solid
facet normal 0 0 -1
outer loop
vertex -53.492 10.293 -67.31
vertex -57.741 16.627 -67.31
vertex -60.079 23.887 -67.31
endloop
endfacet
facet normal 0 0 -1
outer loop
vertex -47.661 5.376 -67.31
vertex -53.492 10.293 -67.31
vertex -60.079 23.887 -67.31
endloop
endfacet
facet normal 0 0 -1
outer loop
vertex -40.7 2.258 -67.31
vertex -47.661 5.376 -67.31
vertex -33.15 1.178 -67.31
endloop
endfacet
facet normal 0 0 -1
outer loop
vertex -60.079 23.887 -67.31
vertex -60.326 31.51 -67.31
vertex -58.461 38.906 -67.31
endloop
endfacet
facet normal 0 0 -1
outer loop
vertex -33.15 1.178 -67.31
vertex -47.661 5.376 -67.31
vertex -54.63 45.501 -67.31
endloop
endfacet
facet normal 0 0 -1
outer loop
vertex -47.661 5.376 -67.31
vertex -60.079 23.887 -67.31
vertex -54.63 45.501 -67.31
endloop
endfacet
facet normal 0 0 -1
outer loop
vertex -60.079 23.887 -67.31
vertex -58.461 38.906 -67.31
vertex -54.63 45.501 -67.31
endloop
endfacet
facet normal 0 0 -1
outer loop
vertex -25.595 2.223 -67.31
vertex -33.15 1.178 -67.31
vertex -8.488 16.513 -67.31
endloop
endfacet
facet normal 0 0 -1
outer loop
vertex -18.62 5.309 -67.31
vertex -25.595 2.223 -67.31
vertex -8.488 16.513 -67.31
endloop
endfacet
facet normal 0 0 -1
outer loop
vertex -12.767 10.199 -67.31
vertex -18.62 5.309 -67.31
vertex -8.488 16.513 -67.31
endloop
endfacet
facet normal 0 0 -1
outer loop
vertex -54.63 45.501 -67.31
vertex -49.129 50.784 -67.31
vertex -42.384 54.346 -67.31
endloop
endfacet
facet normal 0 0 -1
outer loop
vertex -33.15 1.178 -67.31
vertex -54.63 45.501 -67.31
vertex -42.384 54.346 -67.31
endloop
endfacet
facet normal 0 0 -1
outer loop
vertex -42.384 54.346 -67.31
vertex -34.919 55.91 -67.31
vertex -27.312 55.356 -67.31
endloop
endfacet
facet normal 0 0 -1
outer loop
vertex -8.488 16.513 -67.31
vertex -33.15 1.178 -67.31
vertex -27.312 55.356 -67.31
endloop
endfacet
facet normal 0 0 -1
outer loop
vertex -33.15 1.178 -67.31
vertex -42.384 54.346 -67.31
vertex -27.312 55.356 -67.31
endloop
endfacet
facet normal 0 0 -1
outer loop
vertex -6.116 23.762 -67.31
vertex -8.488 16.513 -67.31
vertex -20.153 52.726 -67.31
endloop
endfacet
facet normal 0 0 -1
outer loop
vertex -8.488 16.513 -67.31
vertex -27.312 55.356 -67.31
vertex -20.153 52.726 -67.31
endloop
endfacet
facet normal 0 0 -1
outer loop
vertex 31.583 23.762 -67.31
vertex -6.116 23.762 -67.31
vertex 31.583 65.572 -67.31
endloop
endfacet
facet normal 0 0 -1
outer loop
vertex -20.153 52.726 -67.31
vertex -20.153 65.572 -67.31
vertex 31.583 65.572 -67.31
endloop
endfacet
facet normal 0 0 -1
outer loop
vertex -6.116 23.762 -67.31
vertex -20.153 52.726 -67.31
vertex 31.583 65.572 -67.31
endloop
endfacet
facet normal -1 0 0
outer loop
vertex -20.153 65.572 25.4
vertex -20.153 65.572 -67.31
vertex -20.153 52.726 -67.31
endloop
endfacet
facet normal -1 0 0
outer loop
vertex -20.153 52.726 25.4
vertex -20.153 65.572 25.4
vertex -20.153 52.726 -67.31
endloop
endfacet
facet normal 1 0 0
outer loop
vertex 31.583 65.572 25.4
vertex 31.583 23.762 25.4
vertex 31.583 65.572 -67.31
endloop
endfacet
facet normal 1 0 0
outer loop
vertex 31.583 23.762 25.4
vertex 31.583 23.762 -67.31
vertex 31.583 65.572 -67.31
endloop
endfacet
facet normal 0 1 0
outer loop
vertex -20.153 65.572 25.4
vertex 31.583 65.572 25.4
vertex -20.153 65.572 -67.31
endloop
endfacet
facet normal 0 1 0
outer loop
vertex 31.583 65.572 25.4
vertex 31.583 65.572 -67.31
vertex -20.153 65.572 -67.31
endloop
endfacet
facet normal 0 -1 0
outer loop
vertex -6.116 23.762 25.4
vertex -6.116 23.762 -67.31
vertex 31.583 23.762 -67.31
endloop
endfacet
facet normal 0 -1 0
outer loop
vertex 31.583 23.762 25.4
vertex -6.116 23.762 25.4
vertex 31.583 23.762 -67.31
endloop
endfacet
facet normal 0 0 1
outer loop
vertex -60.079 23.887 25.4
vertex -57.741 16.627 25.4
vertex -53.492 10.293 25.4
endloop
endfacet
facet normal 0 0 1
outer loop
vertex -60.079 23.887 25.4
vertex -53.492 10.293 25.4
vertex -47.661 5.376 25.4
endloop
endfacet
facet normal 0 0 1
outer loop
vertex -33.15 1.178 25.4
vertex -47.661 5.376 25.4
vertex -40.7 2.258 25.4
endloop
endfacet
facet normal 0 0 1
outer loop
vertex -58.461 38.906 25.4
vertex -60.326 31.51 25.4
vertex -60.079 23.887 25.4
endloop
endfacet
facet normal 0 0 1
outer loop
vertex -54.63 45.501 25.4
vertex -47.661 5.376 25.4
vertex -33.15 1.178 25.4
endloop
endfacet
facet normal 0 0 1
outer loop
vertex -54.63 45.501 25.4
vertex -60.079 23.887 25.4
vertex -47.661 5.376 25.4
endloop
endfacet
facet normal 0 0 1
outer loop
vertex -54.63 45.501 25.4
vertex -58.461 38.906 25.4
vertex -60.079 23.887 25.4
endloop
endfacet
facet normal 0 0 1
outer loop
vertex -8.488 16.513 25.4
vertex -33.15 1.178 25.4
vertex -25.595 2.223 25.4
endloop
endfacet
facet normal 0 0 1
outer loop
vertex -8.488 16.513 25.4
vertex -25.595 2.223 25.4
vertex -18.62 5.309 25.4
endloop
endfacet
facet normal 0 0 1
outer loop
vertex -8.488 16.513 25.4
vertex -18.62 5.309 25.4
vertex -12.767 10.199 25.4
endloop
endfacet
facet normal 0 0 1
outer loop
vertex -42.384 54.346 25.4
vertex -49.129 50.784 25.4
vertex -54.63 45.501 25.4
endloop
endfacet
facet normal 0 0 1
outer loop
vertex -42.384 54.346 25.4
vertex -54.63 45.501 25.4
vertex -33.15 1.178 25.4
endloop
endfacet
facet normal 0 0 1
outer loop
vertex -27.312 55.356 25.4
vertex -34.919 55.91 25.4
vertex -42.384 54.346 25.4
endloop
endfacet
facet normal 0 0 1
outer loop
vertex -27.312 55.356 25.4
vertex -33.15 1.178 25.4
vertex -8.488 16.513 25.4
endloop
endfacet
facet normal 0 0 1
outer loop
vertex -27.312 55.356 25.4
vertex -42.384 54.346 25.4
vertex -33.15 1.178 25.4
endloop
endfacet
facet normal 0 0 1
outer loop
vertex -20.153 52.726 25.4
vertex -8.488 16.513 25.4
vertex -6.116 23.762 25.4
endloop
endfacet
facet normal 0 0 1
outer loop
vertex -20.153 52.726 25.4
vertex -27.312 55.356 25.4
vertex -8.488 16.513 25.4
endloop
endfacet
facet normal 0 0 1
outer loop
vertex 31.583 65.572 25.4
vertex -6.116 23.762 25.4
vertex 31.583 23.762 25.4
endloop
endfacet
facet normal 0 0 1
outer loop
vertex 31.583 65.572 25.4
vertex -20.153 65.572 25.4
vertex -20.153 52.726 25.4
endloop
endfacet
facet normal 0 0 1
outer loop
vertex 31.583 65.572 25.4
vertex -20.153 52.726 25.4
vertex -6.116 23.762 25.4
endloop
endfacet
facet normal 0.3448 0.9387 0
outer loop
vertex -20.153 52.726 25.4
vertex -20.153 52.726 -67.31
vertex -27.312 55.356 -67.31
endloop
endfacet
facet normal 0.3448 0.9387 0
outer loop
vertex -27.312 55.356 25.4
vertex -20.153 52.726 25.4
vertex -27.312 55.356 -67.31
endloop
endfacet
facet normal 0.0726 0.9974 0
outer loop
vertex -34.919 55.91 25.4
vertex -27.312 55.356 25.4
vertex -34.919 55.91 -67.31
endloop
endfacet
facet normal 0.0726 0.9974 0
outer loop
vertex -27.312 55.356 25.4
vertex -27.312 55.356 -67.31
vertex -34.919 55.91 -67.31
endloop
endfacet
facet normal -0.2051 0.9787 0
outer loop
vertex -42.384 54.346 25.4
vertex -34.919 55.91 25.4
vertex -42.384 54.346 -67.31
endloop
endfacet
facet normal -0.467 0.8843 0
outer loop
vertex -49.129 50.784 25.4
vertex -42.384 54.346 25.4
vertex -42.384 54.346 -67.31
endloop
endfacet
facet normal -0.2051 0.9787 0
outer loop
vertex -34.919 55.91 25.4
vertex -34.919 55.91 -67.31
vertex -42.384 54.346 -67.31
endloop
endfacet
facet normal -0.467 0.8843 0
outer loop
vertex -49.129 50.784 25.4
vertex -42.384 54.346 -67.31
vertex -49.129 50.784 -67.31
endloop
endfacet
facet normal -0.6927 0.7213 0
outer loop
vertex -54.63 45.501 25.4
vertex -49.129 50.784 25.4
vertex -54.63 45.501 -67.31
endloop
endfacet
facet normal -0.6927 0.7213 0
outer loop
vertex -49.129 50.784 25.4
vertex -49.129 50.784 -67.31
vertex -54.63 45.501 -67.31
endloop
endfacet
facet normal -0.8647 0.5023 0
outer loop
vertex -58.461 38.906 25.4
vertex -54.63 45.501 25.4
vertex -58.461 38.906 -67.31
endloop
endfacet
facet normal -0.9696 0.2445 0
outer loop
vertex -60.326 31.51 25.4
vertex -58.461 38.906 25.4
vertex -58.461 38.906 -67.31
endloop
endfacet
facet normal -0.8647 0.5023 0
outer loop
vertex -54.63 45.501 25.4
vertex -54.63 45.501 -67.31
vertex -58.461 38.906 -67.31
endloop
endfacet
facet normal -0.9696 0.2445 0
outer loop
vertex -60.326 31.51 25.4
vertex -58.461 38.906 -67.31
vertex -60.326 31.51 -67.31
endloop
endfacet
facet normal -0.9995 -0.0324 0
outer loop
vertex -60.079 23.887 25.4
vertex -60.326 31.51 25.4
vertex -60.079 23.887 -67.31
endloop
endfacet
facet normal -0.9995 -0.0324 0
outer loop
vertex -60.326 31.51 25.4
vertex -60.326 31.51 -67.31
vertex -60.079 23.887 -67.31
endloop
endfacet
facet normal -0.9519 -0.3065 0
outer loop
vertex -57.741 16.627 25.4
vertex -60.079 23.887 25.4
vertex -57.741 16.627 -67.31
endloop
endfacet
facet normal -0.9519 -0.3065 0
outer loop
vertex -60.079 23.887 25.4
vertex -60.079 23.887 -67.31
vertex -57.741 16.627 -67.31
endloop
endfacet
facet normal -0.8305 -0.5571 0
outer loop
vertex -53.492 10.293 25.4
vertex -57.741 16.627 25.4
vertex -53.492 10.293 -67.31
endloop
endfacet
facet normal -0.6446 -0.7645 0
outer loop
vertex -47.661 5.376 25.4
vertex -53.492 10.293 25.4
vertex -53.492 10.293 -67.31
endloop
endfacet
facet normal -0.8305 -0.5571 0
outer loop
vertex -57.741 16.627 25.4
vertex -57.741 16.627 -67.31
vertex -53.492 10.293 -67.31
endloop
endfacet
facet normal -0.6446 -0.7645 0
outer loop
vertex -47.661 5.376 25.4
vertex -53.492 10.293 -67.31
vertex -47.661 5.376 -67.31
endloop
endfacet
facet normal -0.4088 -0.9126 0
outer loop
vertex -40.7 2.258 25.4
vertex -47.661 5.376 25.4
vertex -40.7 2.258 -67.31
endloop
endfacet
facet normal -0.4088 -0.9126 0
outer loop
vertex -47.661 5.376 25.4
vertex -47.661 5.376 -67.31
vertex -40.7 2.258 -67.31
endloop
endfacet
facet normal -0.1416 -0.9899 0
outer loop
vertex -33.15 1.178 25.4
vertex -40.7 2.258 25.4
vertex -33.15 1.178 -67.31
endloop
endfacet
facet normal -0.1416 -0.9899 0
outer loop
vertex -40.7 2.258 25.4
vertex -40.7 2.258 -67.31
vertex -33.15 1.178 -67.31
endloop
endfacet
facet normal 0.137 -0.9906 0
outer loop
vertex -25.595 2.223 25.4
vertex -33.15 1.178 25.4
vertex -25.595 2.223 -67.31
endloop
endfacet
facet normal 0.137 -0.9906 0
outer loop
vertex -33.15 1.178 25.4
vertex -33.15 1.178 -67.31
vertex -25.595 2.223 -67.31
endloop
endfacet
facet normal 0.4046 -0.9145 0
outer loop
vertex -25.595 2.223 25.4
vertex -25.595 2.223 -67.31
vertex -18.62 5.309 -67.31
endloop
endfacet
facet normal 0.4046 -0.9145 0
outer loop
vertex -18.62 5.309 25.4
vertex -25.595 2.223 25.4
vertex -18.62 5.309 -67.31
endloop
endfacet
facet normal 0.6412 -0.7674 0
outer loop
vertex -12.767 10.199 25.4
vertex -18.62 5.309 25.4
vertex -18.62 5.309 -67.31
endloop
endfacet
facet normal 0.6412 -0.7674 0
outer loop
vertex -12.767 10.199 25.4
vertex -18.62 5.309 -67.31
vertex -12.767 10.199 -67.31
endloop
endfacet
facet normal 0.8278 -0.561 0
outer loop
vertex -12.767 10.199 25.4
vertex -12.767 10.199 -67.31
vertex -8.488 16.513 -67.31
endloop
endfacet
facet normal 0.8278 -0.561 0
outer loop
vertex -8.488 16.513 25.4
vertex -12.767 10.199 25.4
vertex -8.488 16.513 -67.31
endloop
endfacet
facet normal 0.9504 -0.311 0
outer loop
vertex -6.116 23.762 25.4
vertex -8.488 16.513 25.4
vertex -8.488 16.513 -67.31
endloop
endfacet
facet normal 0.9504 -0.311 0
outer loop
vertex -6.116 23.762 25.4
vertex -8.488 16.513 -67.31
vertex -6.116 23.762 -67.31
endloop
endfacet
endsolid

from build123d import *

# Parameters (mm, degrees)
F1_DEPTH = 67.31
F2_DEPTH = 25.4


with BuildPart() as f1:
    # F0 (on Top) → F1 (new body)
    with BuildSketch(Plane.XY):
        with BuildLine():
            ThreePointArc((-6.1162381901, 23.7623695284), (-5.7969324328, 26.1592759352), (-5.6902200774, 28.5750012845))
            ThreePointArc((-5.6902200774, 28.5750012845), (-9.5823604521, 42.6503078125), (-20.1528966427, 52.7263573954))
            Line((-20.1528966427, 52.7263573954), (-20.1528966427, 23.7623695284))
            Line((-20.1528966427, 23.7623695284), (-6.1162381901, 23.7623695284))
        make_face()
        with BuildLine():
            ThreePointArc((-20.1528966427, 52.7263573954), (-9.5823604521, 42.6503078125), (-5.6902200774, 28.5750012845))
            ThreePointArc((-5.6902200774, 28.5750012845), (-5.7969324328, 26.1592759352), (-6.1162381901, 23.7623695284))
            Line((-6.1162381901, 23.7623695284), (31.5828956664, 23.7623695284))
            Line((31.5828956664, 23.7623695284), (31.5828956664, 65.5721053481))
            Line((31.5828956664, 65.5721053481), (-20.1528966427, 65.5721053481))
            Line((-20.1528966427, 65.5721053481), (-20.1528966427, 52.7263573954))
        make_face()
        with BuildLine():
            Line((-20.1528966427, 23.7623695284), (-20.1528966427, 52.7263573954))
            ThreePointArc((-20.1528966427, 52.7263573954), (-57.7408795784, 16.6270512491), (-6.1162381901, 23.7623695284))
            Line((-6.1162381901, 23.7623695284), (-20.1528966427, 23.7623695284))
        make_face()
    extrude(amount=-F1_DEPTH)

    # F0 (on Top) → F2 (join)
    with BuildSketch(Plane.XY):
        with BuildLine():
            ThreePointArc((-6.1162381901, 23.7623695284), (-5.7969324328, 26.1592759352), (-5.6902200774, 28.5750012845))
            ThreePointArc((-5.6902200774, 28.5750012845), (-9.5823604521, 42.6503078125), (-20.1528966427, 52.7263573954))
            Line((-20.1528966427, 52.7263573954), (-20.1528966427, 23.7623695284))
            Line((-20.1528966427, 23.7623695284), (-6.1162381901, 23.7623695284))
        make_face()
        with BuildLine():
            ThreePointArc((-20.1528966427, 52.7263573954), (-9.5823604521, 42.6503078125), (-5.6902200774, 28.5750012845))
            ThreePointArc((-5.6902200774, 28.5750012845), (-5.7969324328, 26.1592759352), (-6.1162381901, 23.7623695284))
            Line((-6.1162381901, 23.7623695284), (31.5828956664, 23.7623695284))
            Line((31.5828956664, 23.7623695284), (31.5828956664, 65.5721053481))
            Line((31.5828956664, 65.5721053481), (-20.1528966427, 65.5721053481))
            Line((-20.1528966427, 65.5721053481), (-20.1528966427, 52.7263573954))
        make_face()
        with BuildLine():
            Line((-20.1528966427, 23.7623695284), (-20.1528966427, 52.7263573954))
            ThreePointArc((-20.1528966427, 52.7263573954), (-57.7408795784, 16.6270512491), (-6.1162381901, 23.7623695284))
            Line((-6.1162381901, 23.7623695284), (-20.1528966427, 23.7623695284))
        make_face()
    extrude(amount=F2_DEPTH)


solid = f1.part
